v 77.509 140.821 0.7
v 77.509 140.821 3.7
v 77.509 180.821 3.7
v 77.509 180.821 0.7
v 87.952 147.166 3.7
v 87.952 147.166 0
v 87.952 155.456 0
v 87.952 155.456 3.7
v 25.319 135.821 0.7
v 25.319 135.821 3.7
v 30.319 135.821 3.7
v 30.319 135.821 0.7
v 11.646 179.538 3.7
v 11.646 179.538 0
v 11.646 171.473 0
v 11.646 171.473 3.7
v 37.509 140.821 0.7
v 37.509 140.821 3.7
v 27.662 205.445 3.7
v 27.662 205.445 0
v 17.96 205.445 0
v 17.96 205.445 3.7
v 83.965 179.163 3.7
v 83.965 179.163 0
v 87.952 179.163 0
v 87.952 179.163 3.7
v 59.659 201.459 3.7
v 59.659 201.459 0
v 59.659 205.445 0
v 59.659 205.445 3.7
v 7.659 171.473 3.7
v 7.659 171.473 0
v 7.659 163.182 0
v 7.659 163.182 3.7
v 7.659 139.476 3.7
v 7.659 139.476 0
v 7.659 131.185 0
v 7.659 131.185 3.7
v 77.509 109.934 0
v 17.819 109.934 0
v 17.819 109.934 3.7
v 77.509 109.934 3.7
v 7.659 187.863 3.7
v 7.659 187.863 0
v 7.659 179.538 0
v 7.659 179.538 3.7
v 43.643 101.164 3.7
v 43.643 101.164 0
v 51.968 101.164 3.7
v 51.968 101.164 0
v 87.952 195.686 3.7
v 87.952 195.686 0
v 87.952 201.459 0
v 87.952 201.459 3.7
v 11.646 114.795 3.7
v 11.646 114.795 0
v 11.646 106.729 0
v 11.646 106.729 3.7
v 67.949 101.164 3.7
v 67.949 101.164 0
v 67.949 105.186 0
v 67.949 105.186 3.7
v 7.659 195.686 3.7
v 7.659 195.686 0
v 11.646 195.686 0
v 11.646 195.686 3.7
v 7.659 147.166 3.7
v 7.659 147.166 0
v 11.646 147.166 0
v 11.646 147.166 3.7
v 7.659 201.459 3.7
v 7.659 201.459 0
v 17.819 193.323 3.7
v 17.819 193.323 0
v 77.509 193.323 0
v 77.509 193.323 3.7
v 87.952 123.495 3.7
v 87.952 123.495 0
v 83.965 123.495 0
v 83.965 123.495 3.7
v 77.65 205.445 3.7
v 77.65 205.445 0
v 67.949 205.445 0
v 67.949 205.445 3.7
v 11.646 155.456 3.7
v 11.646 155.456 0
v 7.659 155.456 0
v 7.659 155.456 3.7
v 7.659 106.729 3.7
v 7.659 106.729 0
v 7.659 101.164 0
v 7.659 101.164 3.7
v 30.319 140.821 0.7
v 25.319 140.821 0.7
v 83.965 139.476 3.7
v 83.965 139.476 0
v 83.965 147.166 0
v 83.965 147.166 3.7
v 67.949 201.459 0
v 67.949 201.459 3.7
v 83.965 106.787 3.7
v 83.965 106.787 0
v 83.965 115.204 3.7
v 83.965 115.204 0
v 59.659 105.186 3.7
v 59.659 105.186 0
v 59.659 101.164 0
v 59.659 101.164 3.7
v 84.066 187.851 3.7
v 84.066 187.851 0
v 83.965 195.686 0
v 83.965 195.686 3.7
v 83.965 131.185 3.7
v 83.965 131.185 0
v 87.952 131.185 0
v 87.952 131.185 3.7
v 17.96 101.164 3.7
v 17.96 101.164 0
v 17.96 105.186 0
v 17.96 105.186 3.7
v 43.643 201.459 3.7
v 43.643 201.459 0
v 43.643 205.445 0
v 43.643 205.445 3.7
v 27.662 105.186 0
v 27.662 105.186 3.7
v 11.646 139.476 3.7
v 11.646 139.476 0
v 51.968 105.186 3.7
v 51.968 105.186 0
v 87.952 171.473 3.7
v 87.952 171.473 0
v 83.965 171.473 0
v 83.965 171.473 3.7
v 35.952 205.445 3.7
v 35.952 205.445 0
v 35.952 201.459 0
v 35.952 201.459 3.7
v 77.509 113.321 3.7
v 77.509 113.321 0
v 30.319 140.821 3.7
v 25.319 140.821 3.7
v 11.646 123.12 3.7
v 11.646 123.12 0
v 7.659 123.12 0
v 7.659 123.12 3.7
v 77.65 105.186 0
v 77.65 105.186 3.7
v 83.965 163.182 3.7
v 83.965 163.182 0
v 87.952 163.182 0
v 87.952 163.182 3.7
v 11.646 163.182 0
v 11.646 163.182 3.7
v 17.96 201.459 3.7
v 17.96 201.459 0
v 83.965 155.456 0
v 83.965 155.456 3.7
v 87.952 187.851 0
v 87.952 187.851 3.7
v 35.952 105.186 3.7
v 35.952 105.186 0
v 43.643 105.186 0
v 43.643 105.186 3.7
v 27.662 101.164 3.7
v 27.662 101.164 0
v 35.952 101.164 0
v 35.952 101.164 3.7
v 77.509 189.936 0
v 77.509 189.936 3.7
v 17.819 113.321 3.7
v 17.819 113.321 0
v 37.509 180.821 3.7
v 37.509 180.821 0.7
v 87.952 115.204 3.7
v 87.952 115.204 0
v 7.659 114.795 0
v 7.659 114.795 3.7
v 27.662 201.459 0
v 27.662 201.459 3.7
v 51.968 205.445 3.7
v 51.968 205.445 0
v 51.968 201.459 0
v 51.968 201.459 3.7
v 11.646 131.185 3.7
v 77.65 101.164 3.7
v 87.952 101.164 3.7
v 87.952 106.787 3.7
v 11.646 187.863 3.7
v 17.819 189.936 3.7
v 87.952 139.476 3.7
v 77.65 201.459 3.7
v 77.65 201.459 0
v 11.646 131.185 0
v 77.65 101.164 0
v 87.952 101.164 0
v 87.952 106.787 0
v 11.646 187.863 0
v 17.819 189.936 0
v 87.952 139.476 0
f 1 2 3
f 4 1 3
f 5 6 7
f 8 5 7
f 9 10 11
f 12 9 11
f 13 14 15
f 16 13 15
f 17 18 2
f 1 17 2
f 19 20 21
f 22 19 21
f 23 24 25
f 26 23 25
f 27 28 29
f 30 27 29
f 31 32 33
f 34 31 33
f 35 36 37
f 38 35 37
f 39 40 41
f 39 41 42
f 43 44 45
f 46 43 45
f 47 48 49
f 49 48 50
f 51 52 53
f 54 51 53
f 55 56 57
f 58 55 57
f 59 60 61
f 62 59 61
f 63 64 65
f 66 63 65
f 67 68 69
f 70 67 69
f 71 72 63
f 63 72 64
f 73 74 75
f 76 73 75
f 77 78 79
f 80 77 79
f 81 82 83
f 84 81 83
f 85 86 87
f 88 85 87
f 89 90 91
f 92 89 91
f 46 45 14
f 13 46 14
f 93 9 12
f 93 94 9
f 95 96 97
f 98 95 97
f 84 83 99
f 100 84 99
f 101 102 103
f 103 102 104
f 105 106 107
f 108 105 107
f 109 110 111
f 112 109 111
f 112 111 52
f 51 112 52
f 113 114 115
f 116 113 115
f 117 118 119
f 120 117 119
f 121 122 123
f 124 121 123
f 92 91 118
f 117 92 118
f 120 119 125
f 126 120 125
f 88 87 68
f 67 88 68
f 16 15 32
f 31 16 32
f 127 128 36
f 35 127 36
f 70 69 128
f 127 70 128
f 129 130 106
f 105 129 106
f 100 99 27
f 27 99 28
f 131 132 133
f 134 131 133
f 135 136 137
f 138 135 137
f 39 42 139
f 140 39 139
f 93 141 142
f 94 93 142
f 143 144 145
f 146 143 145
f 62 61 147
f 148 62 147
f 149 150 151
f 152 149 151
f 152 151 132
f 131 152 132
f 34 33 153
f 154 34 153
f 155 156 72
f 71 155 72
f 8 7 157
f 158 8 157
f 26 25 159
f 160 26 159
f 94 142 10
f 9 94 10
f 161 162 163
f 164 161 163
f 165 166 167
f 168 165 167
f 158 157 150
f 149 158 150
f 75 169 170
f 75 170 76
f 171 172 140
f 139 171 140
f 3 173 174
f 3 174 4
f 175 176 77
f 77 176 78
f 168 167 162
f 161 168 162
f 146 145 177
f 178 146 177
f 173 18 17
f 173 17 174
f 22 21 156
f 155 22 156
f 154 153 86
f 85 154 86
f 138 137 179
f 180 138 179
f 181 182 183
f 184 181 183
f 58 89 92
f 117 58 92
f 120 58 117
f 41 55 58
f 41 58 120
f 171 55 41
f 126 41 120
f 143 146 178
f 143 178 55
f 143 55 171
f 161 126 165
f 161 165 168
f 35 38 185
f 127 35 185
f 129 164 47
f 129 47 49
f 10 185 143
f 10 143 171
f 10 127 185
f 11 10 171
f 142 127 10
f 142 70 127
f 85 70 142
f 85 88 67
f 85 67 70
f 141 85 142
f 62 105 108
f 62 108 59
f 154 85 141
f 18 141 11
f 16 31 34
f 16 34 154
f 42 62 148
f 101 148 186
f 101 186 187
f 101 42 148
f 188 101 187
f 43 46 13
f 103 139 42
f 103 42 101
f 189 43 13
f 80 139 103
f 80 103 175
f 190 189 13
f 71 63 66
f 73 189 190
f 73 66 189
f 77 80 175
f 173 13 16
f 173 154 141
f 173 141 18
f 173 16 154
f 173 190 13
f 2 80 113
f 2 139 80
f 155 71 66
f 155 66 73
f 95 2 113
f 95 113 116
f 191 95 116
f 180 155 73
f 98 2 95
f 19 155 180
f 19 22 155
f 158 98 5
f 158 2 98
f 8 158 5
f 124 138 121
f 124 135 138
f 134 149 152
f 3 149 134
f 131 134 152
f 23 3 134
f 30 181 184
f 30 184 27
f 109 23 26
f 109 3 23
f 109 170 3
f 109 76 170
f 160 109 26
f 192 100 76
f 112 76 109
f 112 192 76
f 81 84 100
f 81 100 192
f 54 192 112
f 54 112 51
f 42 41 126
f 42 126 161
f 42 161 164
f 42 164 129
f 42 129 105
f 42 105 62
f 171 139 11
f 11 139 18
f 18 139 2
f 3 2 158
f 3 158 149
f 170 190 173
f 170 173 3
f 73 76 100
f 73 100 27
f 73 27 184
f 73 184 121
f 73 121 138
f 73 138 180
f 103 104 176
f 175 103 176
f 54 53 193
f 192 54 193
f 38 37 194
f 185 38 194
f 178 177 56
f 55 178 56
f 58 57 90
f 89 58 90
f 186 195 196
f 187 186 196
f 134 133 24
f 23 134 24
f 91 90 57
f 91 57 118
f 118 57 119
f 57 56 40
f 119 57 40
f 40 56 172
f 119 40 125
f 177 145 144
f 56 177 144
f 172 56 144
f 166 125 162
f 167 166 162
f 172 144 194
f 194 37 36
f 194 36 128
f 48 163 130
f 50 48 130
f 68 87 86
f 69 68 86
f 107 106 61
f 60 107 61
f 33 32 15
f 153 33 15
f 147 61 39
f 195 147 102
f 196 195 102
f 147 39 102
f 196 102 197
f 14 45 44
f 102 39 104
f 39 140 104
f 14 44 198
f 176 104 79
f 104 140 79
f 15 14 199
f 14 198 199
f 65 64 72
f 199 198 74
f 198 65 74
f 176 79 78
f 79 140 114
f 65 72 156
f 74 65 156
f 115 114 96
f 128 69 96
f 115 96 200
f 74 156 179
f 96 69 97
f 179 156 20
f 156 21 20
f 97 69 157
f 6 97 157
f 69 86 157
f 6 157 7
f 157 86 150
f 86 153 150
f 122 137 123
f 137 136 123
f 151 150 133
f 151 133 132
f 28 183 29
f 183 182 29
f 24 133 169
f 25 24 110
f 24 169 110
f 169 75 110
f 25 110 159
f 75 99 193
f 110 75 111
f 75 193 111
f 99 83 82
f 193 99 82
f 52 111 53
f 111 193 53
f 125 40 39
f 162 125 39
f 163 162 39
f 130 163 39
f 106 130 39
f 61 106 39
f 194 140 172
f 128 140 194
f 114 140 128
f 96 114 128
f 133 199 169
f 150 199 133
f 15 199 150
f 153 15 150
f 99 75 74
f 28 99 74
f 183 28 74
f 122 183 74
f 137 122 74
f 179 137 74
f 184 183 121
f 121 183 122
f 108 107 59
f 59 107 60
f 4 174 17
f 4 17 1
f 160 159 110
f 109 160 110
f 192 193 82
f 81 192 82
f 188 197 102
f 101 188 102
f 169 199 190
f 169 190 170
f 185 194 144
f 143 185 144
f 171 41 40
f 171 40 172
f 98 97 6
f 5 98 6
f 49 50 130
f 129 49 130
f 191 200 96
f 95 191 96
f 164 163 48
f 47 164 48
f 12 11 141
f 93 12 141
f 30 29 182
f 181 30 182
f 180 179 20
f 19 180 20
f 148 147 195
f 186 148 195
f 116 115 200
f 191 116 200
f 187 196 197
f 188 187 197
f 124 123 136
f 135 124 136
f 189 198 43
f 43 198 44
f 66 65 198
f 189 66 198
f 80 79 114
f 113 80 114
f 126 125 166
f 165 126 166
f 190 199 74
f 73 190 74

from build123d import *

# Parameters (mm, degrees)
MODEL_W             = 59.689998908
MODEL_H             = 3.386668819
MODEL_H_2           = 3.3866668
BOSS_EXTRUDE1_DEPTH = 3.7
SKETCH1_W           = 2.5
SKETCH1_H           = 2.5
SKETCH1_W_2         = 40
SKETCH1_H_2         = 40
CUT_EXTRUDE1_DEPTH  = 3


with BuildPart() as part:
    # Model → Boss-Extrude1 (new body)
    with BuildSketch(Plane.XY):
        Polygon((7.659321824, 131.185313162), (11.645711781, 131.185313467), (11.645711781, 123.120135193), (7.659323163, 123.120135799), (7.659323163, 114.794580784), (11.645711704, 114.794580995), (11.645711704, 106.729402721), (7.659323085, 106.729402721), (7.659322496, 101.163927511), (17.960431856, 101.163927511), (17.960431856, 105.185592023), (27.661820742, 105.185592023), (27.661820742, 101.163927511), (35.952098518, 101.163927511), (35.952098518, 105.185592023), (43.642655148, 105.185592023), (43.642655148, 101.163927511), (51.968212855, 101.163927511), (51.968212855, 105.185592023), (59.658766793, 105.185592023), (59.658766793, 101.163927511), (67.949044569, 101.163927511), (67.949044569, 105.185592023), (77.650433456, 105.185592023), (77.650433456, 101.163927511), (87.951545673, 101.163927511), (87.951545673, 106.78652537), (83.965155709, 106.78652537), (83.965155709, 115.20447842), (87.951545673, 115.204478756), (87.951545673, 123.494756532), (83.965155708, 123.494756532), (83.965155708, 131.185313162), (87.951545168, 131.185313162), (87.951545168, 139.475590938), (83.965156213, 139.475590938), (83.965156213, 147.166147568), (87.951545168, 147.166147568), (87.951545168, 155.456425344), (83.965156213, 155.456425344), (83.965156213, 163.182259213), (87.951545168, 163.182259213), (87.951545168, 171.472536989), (83.965156213, 171.472536989), (83.965156213, 179.163092274), (87.951545169, 179.163092274), (87.951545169, 187.851347209), (84.066213746, 187.851347204), (83.965155204, 195.685953684), (87.951545169, 195.685953684), (87.951544665, 201.458647414), (77.650433455, 201.458647414), (77.650433455, 205.445036033), (67.949044569, 205.445036033), (67.949044569, 201.458647414), (59.658766793, 201.458647414), (59.658766793, 205.445036033), (51.968212854, 205.445036033), (51.968212854, 201.458647414), (43.642655148, 201.458647414), (43.642655148, 205.445036033), (35.952098517, 205.445036033), (35.952098517, 201.458647414), (27.661820742, 201.458647414), (27.661820742, 205.445036033), (17.960431855, 205.445036033), (17.960431855, 201.458647414), (7.659323162, 201.458647414), (7.659321865, 195.685953684), (11.645710483, 195.685953684), (11.645711788, 187.863269672), (7.65932317, 187.863269672), (7.65932317, 179.537714657), (11.645711788, 179.537715263), (11.645711788, 171.472536989), (7.659321824, 171.472536989), (7.659321824, 163.182259214), (11.645711789, 163.182259214), (11.645711789, 155.456425344), (7.659321824, 155.456425344), (7.659321824, 147.166147568), (11.645711789, 147.166147568), (11.645711789, 139.475590938), (7.659321824, 139.475590938), align=None)
        with Locations((47.664322352, 111.627811013)):
            Rectangle(MODEL_W, MODEL_H, mode=Mode.SUBTRACT)
        with Locations((47.664322352, 191.629758602)):
            Rectangle(MODEL_W, MODEL_H_2, mode=Mode.SUBTRACT)
    extrude(amount=BOSS_EXTRUDE1_DEPTH)

    # Sketch1 → Cut-Extrude1 (cut)
    with BuildSketch(Plane.XY.offset(3.7)):
        with Locations((26.569322898, 137.071145422)):
            Rectangle(SKETCH1_W, SKETCH1_H)
        Polygon((27.819322898, 138.321145422), (27.819322898, 135.821145422), (30.319322898, 135.821145422), (30.319322898, 140.821145422), (25.319322898, 140.821145422), (25.319322898, 138.321145422), align=None)
        with Locations((57.509321806, 160.821145422)):
            Rectangle(SKETCH1_W_2, SKETCH1_H_2)
    extrude(amount=-CUT_EXTRUDE1_DEPTH, mode=Mode.SUBTRACT)


solid = part.part
